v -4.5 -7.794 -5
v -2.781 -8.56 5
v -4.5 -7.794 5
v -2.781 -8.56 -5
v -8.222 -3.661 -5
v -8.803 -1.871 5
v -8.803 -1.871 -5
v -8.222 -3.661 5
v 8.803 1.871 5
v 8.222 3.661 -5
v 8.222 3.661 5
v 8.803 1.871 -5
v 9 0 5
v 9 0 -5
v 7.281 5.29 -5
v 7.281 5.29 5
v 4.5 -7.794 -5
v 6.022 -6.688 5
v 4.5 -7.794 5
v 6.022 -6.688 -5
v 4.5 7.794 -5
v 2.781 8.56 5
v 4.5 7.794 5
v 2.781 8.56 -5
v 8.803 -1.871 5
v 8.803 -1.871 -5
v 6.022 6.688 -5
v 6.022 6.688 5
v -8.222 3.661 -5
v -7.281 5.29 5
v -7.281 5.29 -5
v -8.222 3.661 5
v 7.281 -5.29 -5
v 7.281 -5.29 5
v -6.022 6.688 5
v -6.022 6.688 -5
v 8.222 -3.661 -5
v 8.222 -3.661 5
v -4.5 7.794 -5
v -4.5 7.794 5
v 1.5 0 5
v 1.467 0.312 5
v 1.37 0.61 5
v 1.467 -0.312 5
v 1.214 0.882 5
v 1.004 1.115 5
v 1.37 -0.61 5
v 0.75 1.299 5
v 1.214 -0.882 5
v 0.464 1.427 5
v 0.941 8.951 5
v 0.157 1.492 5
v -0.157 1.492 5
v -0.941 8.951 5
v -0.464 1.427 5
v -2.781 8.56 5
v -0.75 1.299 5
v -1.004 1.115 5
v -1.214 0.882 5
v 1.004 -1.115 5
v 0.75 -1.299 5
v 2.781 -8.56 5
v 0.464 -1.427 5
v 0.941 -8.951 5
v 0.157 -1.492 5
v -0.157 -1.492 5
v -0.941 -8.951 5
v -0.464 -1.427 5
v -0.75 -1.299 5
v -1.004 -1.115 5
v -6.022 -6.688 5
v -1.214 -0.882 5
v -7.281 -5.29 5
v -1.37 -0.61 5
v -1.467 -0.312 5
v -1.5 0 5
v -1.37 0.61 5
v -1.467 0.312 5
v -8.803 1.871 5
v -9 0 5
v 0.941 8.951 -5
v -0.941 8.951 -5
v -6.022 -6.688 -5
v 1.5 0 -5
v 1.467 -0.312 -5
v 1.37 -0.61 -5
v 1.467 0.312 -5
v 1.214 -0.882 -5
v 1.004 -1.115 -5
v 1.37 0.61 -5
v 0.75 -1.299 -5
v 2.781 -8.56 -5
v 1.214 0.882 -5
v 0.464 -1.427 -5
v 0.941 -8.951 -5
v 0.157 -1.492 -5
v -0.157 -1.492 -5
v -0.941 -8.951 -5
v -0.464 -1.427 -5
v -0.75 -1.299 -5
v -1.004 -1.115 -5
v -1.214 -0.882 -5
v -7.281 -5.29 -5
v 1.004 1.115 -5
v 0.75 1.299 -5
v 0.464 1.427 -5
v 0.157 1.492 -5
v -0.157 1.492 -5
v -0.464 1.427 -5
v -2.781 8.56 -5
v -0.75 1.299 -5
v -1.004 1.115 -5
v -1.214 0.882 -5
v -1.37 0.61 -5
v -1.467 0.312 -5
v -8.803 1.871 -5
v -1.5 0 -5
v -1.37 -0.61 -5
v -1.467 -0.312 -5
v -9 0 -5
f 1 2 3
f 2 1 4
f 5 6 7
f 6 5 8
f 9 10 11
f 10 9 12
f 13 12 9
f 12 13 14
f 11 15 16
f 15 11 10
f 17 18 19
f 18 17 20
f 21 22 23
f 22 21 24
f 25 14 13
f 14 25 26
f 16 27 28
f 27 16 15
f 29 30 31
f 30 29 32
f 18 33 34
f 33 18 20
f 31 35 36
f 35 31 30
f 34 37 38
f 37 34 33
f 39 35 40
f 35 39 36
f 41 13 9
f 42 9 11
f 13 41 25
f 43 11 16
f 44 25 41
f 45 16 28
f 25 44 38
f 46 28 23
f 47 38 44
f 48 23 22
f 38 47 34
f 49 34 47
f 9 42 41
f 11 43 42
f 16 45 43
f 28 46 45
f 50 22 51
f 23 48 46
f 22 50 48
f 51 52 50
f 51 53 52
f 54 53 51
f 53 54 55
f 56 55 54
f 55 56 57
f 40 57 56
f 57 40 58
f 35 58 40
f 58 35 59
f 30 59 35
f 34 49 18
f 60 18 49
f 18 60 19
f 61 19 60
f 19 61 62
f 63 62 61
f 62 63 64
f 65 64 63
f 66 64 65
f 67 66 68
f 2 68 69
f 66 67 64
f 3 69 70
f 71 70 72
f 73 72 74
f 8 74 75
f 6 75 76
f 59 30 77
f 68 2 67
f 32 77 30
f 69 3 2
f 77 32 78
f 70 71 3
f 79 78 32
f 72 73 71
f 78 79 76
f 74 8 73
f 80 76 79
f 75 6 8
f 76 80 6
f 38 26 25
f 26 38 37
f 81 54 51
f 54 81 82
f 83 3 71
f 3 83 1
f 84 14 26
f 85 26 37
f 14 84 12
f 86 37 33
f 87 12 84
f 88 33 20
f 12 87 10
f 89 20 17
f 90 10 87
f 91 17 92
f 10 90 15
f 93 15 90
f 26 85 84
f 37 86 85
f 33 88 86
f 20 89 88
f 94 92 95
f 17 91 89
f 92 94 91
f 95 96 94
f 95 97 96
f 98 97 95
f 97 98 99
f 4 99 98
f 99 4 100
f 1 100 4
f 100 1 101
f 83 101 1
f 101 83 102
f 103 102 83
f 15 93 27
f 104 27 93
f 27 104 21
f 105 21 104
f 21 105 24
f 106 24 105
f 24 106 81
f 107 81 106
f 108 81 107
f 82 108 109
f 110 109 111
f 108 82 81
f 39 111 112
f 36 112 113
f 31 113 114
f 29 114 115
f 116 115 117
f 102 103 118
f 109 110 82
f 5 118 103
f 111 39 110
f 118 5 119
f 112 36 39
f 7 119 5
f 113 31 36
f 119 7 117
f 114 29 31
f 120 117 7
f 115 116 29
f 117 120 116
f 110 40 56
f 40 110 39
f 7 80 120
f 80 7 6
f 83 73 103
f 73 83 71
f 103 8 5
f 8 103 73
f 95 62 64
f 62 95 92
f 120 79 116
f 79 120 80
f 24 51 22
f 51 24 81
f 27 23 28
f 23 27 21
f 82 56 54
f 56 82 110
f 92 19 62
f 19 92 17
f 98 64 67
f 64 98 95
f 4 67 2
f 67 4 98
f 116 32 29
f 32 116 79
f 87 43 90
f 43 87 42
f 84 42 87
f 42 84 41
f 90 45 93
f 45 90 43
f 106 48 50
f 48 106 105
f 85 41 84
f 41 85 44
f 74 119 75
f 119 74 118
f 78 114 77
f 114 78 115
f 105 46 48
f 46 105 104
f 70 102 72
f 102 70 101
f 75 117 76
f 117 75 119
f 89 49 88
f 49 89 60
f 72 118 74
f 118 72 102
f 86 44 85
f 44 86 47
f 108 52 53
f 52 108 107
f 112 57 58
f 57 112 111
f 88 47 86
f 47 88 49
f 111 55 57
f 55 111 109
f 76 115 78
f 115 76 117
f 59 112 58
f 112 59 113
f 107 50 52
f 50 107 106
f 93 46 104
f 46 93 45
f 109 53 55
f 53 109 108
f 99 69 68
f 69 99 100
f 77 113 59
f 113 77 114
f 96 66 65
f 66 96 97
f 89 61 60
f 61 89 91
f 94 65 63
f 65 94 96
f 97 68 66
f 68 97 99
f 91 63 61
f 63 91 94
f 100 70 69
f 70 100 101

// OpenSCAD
// file: ../nuts.scad
include <settings.scad>;

module make_hex_nut(w, h, d=0){
    // d = inner diameter
    // w = width across the flats
    // h = height or thickness
    s = w/sqrt(3);
    difference(){
        union(){
            for(i=[0:1:2]){
                rotate([0,0,120*i])
                cube([w, s, h], center=true);
            }
        }
        if(d){
            cylinder(d=d, h=h+1, center=true);
        }
    }
}

//make_hex_nut(w=5, h=2, d=2.5);

module make_nut_2(d=2){
    make_hex_nut(w=4.8, h=2, d=d);
}

module make_nut_w4_h1p5(d=2){
    make_hex_nut(w=4, h=1.5, d=d);
}

module make_nut_2_5(d=2, h=3.5){
    make_hex_nut(w=5+tolerance/2, h=h, d=d);
}

module make_nut_2_5_test(){
    difference(){
        translate([0,0,-.5])
        cube([10,10,2], center=true);
        make_nut_2_5(d=0);
    }
}

module make_nut_2_5_test_downward(){
    difference(){
        translate([0,0,1])
        cube([10,10,2*2.5], center=true);
        color("red")
        make_nut_2_5(d=0);
        color("blue")
        cylinder(d=screw_thread_diameter, h=10, center=true);
    }
}

module make_nut_2_5_test_punchout(){
    difference(){
        translate([0,0,1.5])
        cube([10,10,2*1.5], center=true);
        color("red")
        make_nut_2_5(d=0);
        color("blue")
        cylinder(d=screw_thread_diameter, h=10, center=true);
    }
    color("green")
    translate([0,0,1.8])
    cube([10,10,track_punchout_thickness], center=true);
}

//make_nut_2_5_test();
make_nut_w4_h1p5();
//make_nut_2_5_test_downward();
//make_nut_2_5_test_punchout();
// file: flexiTreads.scad
// Robot tracks w/ flexible fillament
// hristo.staykov@gmail.com

pi = 3.141592653589793238;

//Calculate the variables bellow based on your requirements
//Note that by changing any values, you may also need to compute perfectWheelRadius manually.

trackWidth = 13.5;
trackOffset = 3;        //distance from chassis

wheelRadius = 19;//13.5; //includes the "sprokets" on the wheel

wheelWidth = trackWidth;//8;
wheelOffset = trackOffset + (trackWidth-wheelWidth)/2;
wheelSpacing = 40;//70;
wheelTeeth = 27;//TODO:vary based on wheelSpacing?
wheelSprockets = 17;

// C=2*pi*R + 2*flat
trackLength = 2*wheelRadius*pi + 2*wheelSpacing;

//trackLength = 210;    //Sillicone bracelets usualy have a circumference of 210mm and width of 12mm and can serve as a replacement for the printed tracks. If using a hard-coded value for trackLength, make sure to reflect changes on wheelSpacing.
//wheelSpacing = (trackLength - 2*wheelRadius*3.141592653589793238)/2;

trackRadius = trackLength/2/pi;
trackSprockets = round(wheelSprockets * trackRadius / wheelRadius);

perfectWheelRadius = wheelRadius;//13.5175311111111;  //the closest value to wheelRadius where the wheel sprockets and the track's ones are about the same size.
//TODO: Compute this automatically

//Bolts used for attaching wheels

boltDiameter = 3;	//M3, DIN912, like printrbot's ones
boltHeadHeight = 3;
boltHeadDiameter = 5.5;
boltLength=30;//excl. head
boltUnthreadedSegment=boltLength-18;


module wheel(r, w, offset, motor){
    //Set `motor` to true in order to include a 3mm D-shaft for attaching to pololu micro gearmotors
    inset=2;
    difference(){
	union(){
            rotate_extrude(convexity = 10)
		union(){
			square([r-w/4, w]);
			translate([r-w*1/4, w/2, 0])scale([0.5, 1, 1])circle(w/2, $fn=9);
		}
            difference(){
                translate([0, 0, w])cylinder(r1=5, r2=3, h=offset);
                if(!motor){
                    //cut space for a nut and a washer
                    translate([0, 0, w+offset-3])cylinder(r=5, h=3);
                }
            }//end diff

	}
	union(){
/*
            if (motor){
		translate([0, 0, w+offset-9])motorShaft();
		//the motor wheel will be connected with a module for additional support
            }else{
		
		cylinder(r=1.7, h=offset+w, $fn=32);
		cylinder(r=boltHeadDiameter/2+1, h=(wheelWidth+wheelOffset-boltUnthreadedSegment-3)+1, $fn=32);
		//1 extra mm for a washer
            }
*/

            for(i=[0:wheelSprockets]){
		rotate([0, 0, i*360/wheelSprockets])translate([r, 0, 0])cylinder(r=sprocketSize/2, h=w, $fn=4);
            }
	}	
    }//end diff
}
module wheelCap(inset, width, radius){
	cylinder(h=inset+width, r=5.5/2);
	cylinder(h=width, r=radius);
}
module helperWheel(r, w, wall, offset){
	cylinder(r=r, h=w);
	translate([0, 0, -1])cylinder(r=r+wall, h=1);

}
module motorShaft(){
    //3mm D-shaft for pololu micro gearmotors
    difference(){
	cylinder(h=9,r=1.7, $fn=64);
	translate([-5, 1.25, 0])cube(10);
    }
}


sprocketSize = 4;
module track(r, w=0, fullTrackWidth=0, gripSize=1, gripWidth=0, teeth=0, wr=0, ws=0){
    //Print with flexible fillament
    
    fullTrackWidth = fullTrackWidth ? fullTrackWidth : trackWidth;
    
    C = 2*r*pi;
    //gripSize = 1;//mm
    gripCount = floor(C/2/gripSize);
    //teeth = r;
    teeth = teeth ? teeth : r;
    wr = wr ? wr : wheelRadius;
    ws = ws ? ws : wheelSprockets;
    gripWidth = gripWidth ? gripWidth : fullTrackWidth-2;

    //trackRadius = trackLength/2/pi;
    trackSprockets = round(ws * r / wr);

    echo("fullTrackWidth:", fullTrackWidth);
    difference(){
        cylinder(r=r+1, h=fullTrackWidth, $fn=gripCount);
        cylinder(r=r-w/4, h=fullTrackWidth, $fn=trackSprockets);
        cylinder(r1=r-0.5,r2=r-w/4, h=(fullTrackWidth-w)/2, $fn=trackSprockets);
        translate([0, 0, fullTrackWidth-(fullTrackWidth-w)/2])cylinder(r2=r-0.5,r1=r-w/4, h=(fullTrackWidth-w)/2, $fn=trackSprockets);
        translate([0, 0,  (fullTrackWidth-w)/2]) rotate_extrude(convexity = 10)
		union(){
			square([r-w/4, w]);
			translate([r-w*1/4, w/2, 0])scale([0.5, 1, 1])circle(w/2, $fn=9);
		}
    }//end diff

    translate([0, 0, (fullTrackWidth-w)/2])
        intersection(){
            for(i=[0:trackSprockets]){
		rotate([0, 0, i*360/trackSprockets])translate([r-w*1/4+sprocketSize/2, 0, 0])scale([1, 0.72, 1])cylinder(r=sprocketSize/2, h=w, $fn=4);
            }
            cylinder(r=r, h=w);
        }
    for(i=[0:gripCount]){
        rotate([0, 0, i*360/gripCount])
        translate([r+1, 0, -gripWidth/2+fullTrackWidth/2])
        cylinder(r=gripSize/2, h=gripWidth, $fn=12);
    }

}


//track(trackRadius, wheelWidth);

/*
//mock tread to compare with tread cutout
translate([0,0,50])
color("red")
cylinder(r=trackRadius-.65, h=10, center=true);
*/

translate([0,0,0])wheel(perfectWheelRadius, wheelWidth, wheelOffset, false);

/*
translate([-wheelRadius-2,0,0])
wheel(perfectWheelRadius, wheelWidth, wheelOffset, false);
*/

/*
//mock wheel to compare with spoked wheel
translate([0,0,50])
color("red")
cylinder(r=wheelRadius, h=10, center=true);
*/
// file: ../settings.scad
// Common settings used by all scad files.

// ALL UNITS IN MILLIMETERS (MM)!!!

$fn = 30;//low-res but fast to render
//$fn = 50;//higher-res but slow to render

pi = 3.1415926535897932384626433832795;

max_footprint = 150; // 15x15 cm

bottom_clearance = 10;
bottom_clearance = 25.4/2+10;
//bottom_clearance = 30;

shell_alpha = 0.215;
//shell_alpha = 1.0;

tolerance = 0.5;

// Flat countersunk M2.5mm x 0.45mm machine screw.
screw_thread_diameter = 2.5;//2.8;//2.75;//2.4?
screw_thread_length = 5;//?
screw_head_diameter = 4.75; // M2.5
//screw_head_diameter = 5.2; // M3
screw_head_height = 1.5;//2;

screw_thread_diameter2 = 2;

unit_thickness = 5;
u = unit_thickness;

shell_thickness = unit_thickness;

// Show flags.
show_platform = 0;
show_head = 1;
show_head_shell = 0;
show_head_electronics_bb = 0;
show_battery = 1;
show_foot_cube = 0;
show_torso = 0;
show_motor = 0;
show_motor_plates = 1;
show_motor_inner_plates = 1;
show_motor_outer_plates = 1;
show_wheel = 0;//obsolete
show_tracks = 1;//
show_track_wheels = 1;
show_caster = 0;
show_rpi = 1;
show_vertical_plates = 1;//
show_horizontal_plates = 1;//
show_caster_plates = 0;//obsolete?
show_camera = 1;
show_screen = 0;
show_edge_mount = 1;
show_sonar_mount = 1;
show_recharge_mount = 1;
show_conduit = 1;
show_torso_shell = 1;
show_recharge_dock = 0;
show_head_tilt_axis = 0;
show_rpi_camera_axis = 0;
show_laser_axis = 0;

head_vertical_angle_tilt = 0;
//head_vertical_angle_tilt = 30;//max
//head_vertical_angle_tilt = 10;

torso_height = 120+20;

base_plate_diameter = max_footprint-unit_thickness*2;
base_plate_frame = 0;

head_height = 50;
head_offset_z = max_footprint/2;
head_middle_cutout = 85;

rpi_with_four_hats_and_clearance = 76;

qrd1114_w = 6.10;
qrd1114_l = 4.39;
qrd1114_h = 4.65;

dock_radius = 10;
dock_gripper_border = 2;
dock_gripper_instep = 0.9;
dock_gripper_cutout_tapper = 50;
dock_receiver_height = 5;

// Patriod Fuel+ 9000 mAh
battery_length = 90;
battery_width = 57;
battery_height = 23;
battery_offset_z = 30;//4;

wheel_diameter = 50;
wheel_offset_x = 65;
wheel_offset_z = wheel_diameter/2;
wheel_axle_diameter = 5;

//caster_diameter = 19.05; // 0.75 inches
caster_diameter = 25.45; // 1 inches
//caster_diameter = 15.875; // 5/8 inches
caster_holder_diameter = 30;//31;
caster_offset_y = base_plate_diameter/2 - caster_holder_diameter/2;

arduino_offset_x = 0;
arduino_offset_y = 0;
arduino_offset_z = 67;
arduino_offset_x2 = 0;
arduino_offset_y2 = -20;
arduino_offset_z2 = torso_height+bottom_clearance;

horizontal_plate_width = unit_thickness*8*2 - unit_thickness*2;
horizontal_plate_depth = unit_thickness*8*2;

vertical_plate_width = horizontal_plate_depth;
vertical_plate_height = unit_thickness*8;
vertical_plate_offset_x = wheel_offset_x-22.5;
vertical_plate_offset_z = vertical_plate_height/2 + unit_thickness/2;

vertical_battery_plate_height = 100 - 15;

caster_plate_width = horizontal_plate_width + unit_thickness*2;
caster_plate_mount_length = unit_thickness*4;
caster_plate_width_minor = caster_holder_diameter;

motor_switch_length = 20;
motor_switch_thickness = 6.5;
motor_switch_height = 11;
motor_switch_height_leads = 23;
motor_switch_on_height =  13.3;
motor_switch_hole_diameter = 2.5;
motor_switch_hole_offset_z = 6.5;//this plus diameter/2 is hole center from switch top
motor_switch_hole_spacing = 7.1;// holes are diameter/2 from this

motor_length = 60;
motor_width = 25;
motor_collar_width = 7;
motor_collar_height = 2.5;
motor_axle_width = 4;
motor_axle_height = 9.5;
motor_offset_x = 10;
//motor_offset_y = motor_width/2+5;
motor_offset_y = unit_thickness*3.5;
motor_offset_z = vertical_plate_height/2 - unit_thickness/2;//4;//30;
motor_mount_holes_dist = 17;
// motor countersink hole
motor_mount_holes_width = 3; // M3
motor_mount_holes_head_height = 2.2;
motor_mount_holes_head_width = 5.8;
motor_bearing_outer_diameter = 10;
motor_bearing_inner_diameter = 5.95;
motor_bearing_thickness = 2.5;

motor_unimount_idler_axle_d = screw_thread_diameter;
//motor_unimount_spacer_depth = 0.1;//too small
motor_unimount_spacer_depth = 0.5;

motor_arm_offset_y = -u*3;
motor_arm_offset_z = u*.5;

motor_plate_width = vertical_plate_width;
motor_plate_height = vertical_plate_height;
motor_plate_thickness = unit_thickness;
motor_plate_offset_z = vertical_plate_offset_z;

motor_plate_middle_thickness = 5;

wheel_hub_offset = u*3;

motor_hole_height_offset = -5;

nylon_spacer_outer_diameter = 6.35;
nylon_spacer_inner_diameter = 3.302;
nylon_spacer_length = 12.7;

track_width = unit_thickness*3;
track_offset_x = -50;
track_offset_z = .1;
//track_wheel_radius = 19;//original
track_wheel_radius = 14;
//track_wheel_hole_radius = (nylon_spacer_outer_diameter+1)/2;
track_wheel_hole_radius = motor_bearing_outer_diameter/2;

track_driver_hole_radius = (motor_axle_width)/2 + 0.1;
track_driver_set_screw_head_d = 4.1;
track_driver_set_screw_shaft_d = 2.4;
//track_wheel_width = 13.5;//original
track_wheel_width = u*2;
track_wheel_width_buffer = u*0.25;
track_offset = 3;        //distance from chassis
track_wheel_offset = track_offset;
//track_length = 250; // see tread_triangle.py, too big
//track_length = 240; // see tread_triangle.py
//track_length = 238; //inc/dec in 10 unit increments so notches match idlers
track_length = 228; //inc/dec in 10 unit increments so notches match idlers
track_radius = track_length/2/pi;
track_wheel_show_fancy = 1;
track_wheel_gap = track_wheel_width + track_wheel_width_buffer*2;
track_axle_bearing_diameter = motor_bearing_inner_diameter - 0.1;
track_tensioner_radius = 12;
track_nut_height = 3.5; //TODO
track_punchout_thickness = 0.25;//should be the same as the minimum layer thickness

head_slew_bearing_outer_diameter = 115;
head_slew_bearing_ring_thickness = 20;
head_slew_bearing_inner_diameter = head_slew_bearing_outer_diameter - head_slew_bearing_ring_thickness;
//head_slew_bearing_hole_diameter = head_slew_bearing_inner_diameter - head_slew_bearing_ring_thickness;
head_slew_bearing_hole_diameter = 12+tolerance; // slip ring https://www.adafruit.com/products/775
//head_slew_bearing_ball_diameter = 5;
head_slew_bearing_ball_diameter = 2.5; //u/2;
head_slew_bearing_height = u;//head_slew_bearing_ball_diameter*2;
head_slew_bearing_gap = 0.5;
head_slew_bearing_slew_gap = 0;
head_slew_bearing_gap_factor = 0.1;

neck_strut_width = u*7;
neck_strut_height = u*18;
neck_strut_spacing = u*8;

show_outer_race = 0;
show_inner_race_a = 1;
show_inner_race_b = 1;
show_balls = 0;
// main file
include <../settings.scad>;
use <flexiTreads.scad>;
use <../nuts.scad>;

module make_track_tensioner(r=track_tensioner_radius, h=10){
	hole_d = 3;
	difference(){
	    cylinder(r=r, h=h, center=true);
	    //cylinder(r=hole_d/2 + 1, h=track_wheel_gap-0.1, center=true);
	    cylinder(r=hole_d/2, h=h*2, center=true);
	}
}

module make_track_tensioner_18_10(){
    make_track_tensioner(r=18/2, h=10);
}

//make_track_tensioner();
make_track_tensioner_18_10();
